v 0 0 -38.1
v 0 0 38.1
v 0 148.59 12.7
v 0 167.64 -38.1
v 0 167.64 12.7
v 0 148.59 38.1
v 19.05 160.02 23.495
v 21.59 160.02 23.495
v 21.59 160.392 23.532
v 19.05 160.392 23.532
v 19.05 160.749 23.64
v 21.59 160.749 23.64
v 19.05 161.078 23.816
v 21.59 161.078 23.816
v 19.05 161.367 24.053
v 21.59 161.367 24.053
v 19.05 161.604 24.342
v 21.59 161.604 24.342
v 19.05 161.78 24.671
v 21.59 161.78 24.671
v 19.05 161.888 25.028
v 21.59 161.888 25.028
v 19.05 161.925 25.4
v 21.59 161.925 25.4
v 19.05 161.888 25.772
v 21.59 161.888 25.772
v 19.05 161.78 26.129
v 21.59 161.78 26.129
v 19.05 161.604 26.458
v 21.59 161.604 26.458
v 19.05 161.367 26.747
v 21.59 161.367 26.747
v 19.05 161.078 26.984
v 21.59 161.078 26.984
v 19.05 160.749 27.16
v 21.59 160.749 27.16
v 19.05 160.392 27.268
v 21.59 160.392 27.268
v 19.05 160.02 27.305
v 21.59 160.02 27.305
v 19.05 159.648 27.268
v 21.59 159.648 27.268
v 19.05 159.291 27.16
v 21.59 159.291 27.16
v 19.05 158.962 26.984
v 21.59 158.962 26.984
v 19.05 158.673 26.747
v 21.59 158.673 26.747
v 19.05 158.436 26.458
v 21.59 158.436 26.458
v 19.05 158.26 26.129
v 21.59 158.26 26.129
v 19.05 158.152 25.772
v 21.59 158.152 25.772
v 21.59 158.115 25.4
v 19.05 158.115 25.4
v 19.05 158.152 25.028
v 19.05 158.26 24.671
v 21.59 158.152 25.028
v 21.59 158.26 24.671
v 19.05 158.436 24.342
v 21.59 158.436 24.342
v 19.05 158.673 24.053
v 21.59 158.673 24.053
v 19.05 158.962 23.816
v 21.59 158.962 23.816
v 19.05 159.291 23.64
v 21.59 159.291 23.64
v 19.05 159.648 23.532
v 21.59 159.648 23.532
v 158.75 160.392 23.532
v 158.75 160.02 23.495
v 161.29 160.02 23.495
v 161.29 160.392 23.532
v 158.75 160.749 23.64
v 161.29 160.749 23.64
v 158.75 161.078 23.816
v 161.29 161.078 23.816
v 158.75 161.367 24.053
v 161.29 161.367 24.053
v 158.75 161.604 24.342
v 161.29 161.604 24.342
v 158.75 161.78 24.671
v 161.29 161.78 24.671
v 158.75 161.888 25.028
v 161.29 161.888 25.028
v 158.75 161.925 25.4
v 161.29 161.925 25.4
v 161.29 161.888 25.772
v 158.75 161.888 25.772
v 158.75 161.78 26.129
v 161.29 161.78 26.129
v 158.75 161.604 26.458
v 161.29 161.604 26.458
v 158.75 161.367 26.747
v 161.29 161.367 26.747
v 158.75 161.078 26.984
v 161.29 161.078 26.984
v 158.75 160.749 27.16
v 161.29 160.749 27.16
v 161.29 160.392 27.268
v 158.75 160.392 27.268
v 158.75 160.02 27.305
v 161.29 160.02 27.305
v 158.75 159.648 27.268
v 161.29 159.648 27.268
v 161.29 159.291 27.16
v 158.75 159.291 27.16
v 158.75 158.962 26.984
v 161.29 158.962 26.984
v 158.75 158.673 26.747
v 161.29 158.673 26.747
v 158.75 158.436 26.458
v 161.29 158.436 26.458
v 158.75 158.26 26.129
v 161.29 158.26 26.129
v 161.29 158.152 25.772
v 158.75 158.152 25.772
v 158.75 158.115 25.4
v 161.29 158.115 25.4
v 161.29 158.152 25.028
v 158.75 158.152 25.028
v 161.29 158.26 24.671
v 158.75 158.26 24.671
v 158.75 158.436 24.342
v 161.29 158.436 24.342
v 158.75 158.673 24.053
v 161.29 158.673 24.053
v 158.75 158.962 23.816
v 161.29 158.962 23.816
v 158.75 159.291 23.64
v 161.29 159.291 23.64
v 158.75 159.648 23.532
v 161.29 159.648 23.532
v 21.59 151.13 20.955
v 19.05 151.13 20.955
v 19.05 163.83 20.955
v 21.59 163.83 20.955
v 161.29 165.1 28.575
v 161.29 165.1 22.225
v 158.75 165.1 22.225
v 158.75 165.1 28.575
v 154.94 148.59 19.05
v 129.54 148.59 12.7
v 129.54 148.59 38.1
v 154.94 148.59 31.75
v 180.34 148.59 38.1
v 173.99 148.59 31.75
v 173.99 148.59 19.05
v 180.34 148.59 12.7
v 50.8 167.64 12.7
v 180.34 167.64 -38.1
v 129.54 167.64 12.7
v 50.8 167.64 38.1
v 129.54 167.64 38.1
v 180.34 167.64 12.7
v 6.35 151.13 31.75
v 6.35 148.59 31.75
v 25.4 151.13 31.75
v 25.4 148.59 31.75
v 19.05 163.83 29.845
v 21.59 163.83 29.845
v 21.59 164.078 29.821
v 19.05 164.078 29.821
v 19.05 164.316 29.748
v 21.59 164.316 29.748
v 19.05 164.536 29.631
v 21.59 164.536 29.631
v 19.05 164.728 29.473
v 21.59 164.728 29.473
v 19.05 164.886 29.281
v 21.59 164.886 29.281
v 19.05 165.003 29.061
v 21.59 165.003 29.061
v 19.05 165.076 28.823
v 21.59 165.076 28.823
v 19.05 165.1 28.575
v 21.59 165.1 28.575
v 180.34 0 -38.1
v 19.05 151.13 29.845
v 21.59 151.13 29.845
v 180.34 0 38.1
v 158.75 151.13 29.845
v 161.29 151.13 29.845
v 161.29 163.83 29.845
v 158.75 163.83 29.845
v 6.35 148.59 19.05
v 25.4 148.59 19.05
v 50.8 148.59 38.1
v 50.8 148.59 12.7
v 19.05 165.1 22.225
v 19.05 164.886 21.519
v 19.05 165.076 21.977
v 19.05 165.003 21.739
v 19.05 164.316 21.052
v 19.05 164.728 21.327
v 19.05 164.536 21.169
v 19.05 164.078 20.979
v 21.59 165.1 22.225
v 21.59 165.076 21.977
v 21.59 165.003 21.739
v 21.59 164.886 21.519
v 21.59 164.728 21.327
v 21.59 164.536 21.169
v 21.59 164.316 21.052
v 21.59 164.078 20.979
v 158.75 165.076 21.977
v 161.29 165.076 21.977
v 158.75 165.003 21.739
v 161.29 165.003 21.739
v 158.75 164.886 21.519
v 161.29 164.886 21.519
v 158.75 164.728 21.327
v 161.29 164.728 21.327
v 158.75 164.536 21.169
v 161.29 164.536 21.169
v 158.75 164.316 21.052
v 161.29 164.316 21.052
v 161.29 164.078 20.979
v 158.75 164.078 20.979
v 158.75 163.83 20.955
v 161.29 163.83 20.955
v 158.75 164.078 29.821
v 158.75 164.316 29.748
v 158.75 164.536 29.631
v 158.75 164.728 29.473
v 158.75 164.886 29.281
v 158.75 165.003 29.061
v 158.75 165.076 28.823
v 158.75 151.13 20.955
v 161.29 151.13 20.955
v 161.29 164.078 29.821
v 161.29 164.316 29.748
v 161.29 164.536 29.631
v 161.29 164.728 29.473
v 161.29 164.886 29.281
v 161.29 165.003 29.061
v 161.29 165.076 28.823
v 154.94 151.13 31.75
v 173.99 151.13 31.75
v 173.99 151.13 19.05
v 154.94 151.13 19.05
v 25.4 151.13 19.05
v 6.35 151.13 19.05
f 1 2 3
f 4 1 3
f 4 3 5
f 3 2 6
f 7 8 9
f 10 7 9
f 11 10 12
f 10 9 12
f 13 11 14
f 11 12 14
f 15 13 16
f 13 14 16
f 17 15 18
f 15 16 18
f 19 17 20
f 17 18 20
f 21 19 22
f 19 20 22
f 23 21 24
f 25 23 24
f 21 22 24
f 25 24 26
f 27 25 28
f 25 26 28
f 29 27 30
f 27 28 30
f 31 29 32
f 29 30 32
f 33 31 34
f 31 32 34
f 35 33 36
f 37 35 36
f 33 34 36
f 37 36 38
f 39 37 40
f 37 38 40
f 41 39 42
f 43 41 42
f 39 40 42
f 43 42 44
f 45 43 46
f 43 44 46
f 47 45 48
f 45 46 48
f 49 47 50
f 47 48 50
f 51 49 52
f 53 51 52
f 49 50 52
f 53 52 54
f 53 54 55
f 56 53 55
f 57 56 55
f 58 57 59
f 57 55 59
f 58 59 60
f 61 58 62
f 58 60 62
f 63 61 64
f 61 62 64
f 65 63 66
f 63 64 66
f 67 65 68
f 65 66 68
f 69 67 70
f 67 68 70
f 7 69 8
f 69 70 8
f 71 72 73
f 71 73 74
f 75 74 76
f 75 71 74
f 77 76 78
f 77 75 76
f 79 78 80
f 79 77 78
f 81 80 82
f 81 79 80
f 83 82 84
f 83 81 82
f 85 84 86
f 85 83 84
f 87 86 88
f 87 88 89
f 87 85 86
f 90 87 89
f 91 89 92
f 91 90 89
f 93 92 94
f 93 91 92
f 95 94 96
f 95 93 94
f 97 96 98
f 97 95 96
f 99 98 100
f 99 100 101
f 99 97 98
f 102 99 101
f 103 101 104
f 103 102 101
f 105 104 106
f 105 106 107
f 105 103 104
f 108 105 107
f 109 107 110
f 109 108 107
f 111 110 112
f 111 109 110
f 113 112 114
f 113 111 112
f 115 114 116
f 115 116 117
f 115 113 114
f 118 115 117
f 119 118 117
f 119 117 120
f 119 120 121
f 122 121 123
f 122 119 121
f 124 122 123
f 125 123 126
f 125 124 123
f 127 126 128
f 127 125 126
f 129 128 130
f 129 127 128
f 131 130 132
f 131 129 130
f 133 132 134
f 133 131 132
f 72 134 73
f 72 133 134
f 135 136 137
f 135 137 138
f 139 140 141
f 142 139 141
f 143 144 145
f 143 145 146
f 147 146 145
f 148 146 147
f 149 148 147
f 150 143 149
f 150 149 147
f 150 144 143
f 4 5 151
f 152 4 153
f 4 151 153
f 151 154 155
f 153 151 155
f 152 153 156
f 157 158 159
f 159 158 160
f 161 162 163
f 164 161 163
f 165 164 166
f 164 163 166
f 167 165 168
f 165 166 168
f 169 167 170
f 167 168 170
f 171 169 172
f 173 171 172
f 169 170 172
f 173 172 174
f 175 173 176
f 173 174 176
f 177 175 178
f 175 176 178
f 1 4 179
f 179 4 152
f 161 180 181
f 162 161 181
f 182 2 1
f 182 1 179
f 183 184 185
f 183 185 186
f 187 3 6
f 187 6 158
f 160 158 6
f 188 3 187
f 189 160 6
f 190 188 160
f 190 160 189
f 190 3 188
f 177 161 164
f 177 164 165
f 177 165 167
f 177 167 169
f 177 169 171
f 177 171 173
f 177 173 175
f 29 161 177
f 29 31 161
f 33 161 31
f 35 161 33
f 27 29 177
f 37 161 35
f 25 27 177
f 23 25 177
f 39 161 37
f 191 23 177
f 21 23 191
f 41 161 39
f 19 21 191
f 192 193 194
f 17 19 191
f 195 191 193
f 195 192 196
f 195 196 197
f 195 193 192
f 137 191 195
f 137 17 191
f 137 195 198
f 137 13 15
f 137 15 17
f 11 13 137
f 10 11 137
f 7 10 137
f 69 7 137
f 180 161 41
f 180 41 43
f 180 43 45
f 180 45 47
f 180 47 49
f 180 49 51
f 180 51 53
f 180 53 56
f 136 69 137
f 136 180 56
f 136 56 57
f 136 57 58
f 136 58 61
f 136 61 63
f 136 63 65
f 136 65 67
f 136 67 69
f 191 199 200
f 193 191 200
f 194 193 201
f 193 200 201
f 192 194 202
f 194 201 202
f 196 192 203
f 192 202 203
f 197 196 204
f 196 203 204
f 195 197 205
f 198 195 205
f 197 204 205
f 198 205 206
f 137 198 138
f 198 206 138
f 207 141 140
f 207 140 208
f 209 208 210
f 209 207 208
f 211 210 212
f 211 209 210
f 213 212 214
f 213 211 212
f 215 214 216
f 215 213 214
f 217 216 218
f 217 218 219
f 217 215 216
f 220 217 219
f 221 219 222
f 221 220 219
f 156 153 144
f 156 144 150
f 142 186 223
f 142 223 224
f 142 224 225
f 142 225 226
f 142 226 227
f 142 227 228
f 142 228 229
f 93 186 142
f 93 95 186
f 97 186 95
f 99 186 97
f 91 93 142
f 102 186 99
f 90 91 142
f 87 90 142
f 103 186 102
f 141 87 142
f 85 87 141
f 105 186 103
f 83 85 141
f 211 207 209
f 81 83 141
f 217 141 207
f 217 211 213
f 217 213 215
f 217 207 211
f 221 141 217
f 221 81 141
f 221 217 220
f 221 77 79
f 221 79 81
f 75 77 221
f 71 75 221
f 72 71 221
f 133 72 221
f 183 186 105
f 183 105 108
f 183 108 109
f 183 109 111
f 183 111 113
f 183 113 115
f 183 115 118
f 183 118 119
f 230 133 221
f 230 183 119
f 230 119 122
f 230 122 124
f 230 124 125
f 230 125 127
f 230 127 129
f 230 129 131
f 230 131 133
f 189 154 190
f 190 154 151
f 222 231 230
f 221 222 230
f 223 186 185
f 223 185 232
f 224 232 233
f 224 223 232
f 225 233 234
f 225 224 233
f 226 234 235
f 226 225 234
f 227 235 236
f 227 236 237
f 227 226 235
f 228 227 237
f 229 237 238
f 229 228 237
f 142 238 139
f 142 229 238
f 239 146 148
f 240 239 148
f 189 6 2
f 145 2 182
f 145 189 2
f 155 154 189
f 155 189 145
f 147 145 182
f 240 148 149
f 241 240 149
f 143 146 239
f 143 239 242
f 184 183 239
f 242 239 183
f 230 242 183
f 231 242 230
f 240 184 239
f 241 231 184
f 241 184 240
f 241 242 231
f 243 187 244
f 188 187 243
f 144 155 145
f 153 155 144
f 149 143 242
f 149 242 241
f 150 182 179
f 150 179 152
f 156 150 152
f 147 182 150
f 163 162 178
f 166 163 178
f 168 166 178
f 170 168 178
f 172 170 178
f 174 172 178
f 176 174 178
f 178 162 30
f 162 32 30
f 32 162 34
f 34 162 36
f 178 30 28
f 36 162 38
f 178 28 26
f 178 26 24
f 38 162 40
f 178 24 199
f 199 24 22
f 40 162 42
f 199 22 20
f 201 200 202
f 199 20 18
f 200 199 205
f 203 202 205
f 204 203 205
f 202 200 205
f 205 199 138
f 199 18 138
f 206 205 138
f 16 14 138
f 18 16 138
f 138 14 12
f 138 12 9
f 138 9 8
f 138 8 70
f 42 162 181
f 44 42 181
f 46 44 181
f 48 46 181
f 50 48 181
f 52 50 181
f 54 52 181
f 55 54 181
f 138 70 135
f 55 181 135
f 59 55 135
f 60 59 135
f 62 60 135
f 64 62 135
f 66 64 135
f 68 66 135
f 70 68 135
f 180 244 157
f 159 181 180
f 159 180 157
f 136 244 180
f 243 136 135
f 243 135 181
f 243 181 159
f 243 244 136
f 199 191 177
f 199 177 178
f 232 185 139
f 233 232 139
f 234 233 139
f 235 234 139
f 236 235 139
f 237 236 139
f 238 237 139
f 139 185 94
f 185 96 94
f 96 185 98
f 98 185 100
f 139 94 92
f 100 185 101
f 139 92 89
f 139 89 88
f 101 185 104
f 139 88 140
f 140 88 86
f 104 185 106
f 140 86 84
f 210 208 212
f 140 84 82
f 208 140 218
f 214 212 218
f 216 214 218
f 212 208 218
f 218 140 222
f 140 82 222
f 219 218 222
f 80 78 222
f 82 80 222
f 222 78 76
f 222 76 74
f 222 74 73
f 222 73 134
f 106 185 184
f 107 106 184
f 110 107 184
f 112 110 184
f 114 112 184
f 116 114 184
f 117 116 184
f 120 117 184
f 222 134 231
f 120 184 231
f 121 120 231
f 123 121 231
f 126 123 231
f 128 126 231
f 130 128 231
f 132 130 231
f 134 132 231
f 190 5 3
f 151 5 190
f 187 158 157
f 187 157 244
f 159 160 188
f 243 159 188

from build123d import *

# Parameters (mm, degrees)
SKETCH1_W           = 180.34
SKETCH1_H           = 167.64
CASE_2_DEPTH        = 38.1
SKETCH2_W           = 50.8
SKETCH2_H           = 25.4
TOP_HOLE_DEPTH      = 19.05
SKETCH3_W           = 19.05
SKETCH3_H           = 12.7
BOSS_EXTRUDE2_DEPTH = 2.54
SKETCH4_W           = 2.54
SKETCH4_H           = 8.89
BOSS_EXTRUDE3_DEPTH = 13.97
SKETCH5_R           = 1.905
CUT_EXTRUDE2_DEPTH  = 2.54
SKETCH6_W           = 19.05
SKETCH6_H           = 12.7
BOSS_EXTRUDE4_DEPTH = 2.54


with BuildPart() as part:
    # Sketch1 → case 2 (new body, symmetric)
    with BuildSketch(Plane.XY):
        with Locations((90.17, 83.82)):
            Rectangle(SKETCH1_W, SKETCH1_H)
    extrude(amount=CASE_2_DEPTH, both=True)

    # Sketch2 → top hole (cut)
    with BuildSketch(Plane(origin=(0, 167.64, 0), x_dir=(1, 0, 0), z_dir=(0, 1, 0))):
        with Locations((25.4, -25.4)):
            Rectangle(SKETCH2_W, SKETCH2_H)
        with Locations((154.94, -25.4)):
            Rectangle(SKETCH2_W, SKETCH2_H)
    extrude(amount=-TOP_HOLE_DEPTH, mode=Mode.SUBTRACT)

    # Sketch3 → Boss-Extrude2 (add)
    with BuildSketch(Plane(origin=(0, 148.59, 0), x_dir=(1, 0, 0), z_dir=(0, 1, 0))):
        with Locations((15.875, -25.4)):
            Rectangle(SKETCH3_W, SKETCH3_H)
    extrude(amount=BOSS_EXTRUDE2_DEPTH)

    # Sketch4 → Boss-Extrude3 (add)
    with BuildSketch(Plane(origin=(0, 151.13, 0), x_dir=(1, 0, 0), z_dir=(0, 1, 0))):
        with Locations((20.32, -25.4)):
            Rectangle(SKETCH4_W, SKETCH4_H)
    boss_extrude3 = extrude(amount=BOSS_EXTRUDE3_DEPTH)

    # Sketch5 → Cut-Extrude2 (cut)
    with BuildSketch(Plane(origin=(21.59, 0, 0), x_dir=(0, 0, -1), z_dir=(1, 0, 0))):
        with BuildLine():
            ThreePointArc((-22.225, 165.1), (-21.326974388, 164.728025612), (-20.955, 163.83))
            Line((-20.955, 163.83), (-20.955, 165.1))
            Line((-20.955, 165.1), (-22.225, 165.1))
        make_face()
        with BuildLine():
            Line((-29.845, 165.1), (-29.845, 163.83))
            ThreePointArc((-29.845, 163.83), (-29.473025612, 164.728025612), (-28.575, 165.1))
            Line((-28.575, 165.1), (-29.845, 165.1))
        make_face()
        with Locations((-25.4, 160.02)):
            Circle(SKETCH5_R)
    cut_extrude2 = extrude(amount=-CUT_EXTRUDE2_DEPTH, mode=Mode.SUBTRACT)

    # Sketch6 → Boss-Extrude4 (add)
    with BuildSketch(Plane(origin=(0, 148.59, 0), x_dir=(1, 0, 0), z_dir=(0, 1, 0))):
        with Locations((164.465, -25.4)):
            Rectangle(SKETCH6_W, SKETCH6_H)
    extrude(amount=BOSS_EXTRUDE4_DEPTH)

    # Mirror1: Boss-Extrude3, Cut-Extrude2 across plane
    add(boss_extrude3.mirror(Plane(origin=(90.17, 0, 0), x_dir=(0, 0, 1), z_dir=(1, 0, 0))))
    add(cut_extrude2.mirror(Plane(origin=(90.17, 0, 0), x_dir=(0, 0, 1), z_dir=(1, 0, 0))), mode=Mode.SUBTRACT)


solid = part.part
